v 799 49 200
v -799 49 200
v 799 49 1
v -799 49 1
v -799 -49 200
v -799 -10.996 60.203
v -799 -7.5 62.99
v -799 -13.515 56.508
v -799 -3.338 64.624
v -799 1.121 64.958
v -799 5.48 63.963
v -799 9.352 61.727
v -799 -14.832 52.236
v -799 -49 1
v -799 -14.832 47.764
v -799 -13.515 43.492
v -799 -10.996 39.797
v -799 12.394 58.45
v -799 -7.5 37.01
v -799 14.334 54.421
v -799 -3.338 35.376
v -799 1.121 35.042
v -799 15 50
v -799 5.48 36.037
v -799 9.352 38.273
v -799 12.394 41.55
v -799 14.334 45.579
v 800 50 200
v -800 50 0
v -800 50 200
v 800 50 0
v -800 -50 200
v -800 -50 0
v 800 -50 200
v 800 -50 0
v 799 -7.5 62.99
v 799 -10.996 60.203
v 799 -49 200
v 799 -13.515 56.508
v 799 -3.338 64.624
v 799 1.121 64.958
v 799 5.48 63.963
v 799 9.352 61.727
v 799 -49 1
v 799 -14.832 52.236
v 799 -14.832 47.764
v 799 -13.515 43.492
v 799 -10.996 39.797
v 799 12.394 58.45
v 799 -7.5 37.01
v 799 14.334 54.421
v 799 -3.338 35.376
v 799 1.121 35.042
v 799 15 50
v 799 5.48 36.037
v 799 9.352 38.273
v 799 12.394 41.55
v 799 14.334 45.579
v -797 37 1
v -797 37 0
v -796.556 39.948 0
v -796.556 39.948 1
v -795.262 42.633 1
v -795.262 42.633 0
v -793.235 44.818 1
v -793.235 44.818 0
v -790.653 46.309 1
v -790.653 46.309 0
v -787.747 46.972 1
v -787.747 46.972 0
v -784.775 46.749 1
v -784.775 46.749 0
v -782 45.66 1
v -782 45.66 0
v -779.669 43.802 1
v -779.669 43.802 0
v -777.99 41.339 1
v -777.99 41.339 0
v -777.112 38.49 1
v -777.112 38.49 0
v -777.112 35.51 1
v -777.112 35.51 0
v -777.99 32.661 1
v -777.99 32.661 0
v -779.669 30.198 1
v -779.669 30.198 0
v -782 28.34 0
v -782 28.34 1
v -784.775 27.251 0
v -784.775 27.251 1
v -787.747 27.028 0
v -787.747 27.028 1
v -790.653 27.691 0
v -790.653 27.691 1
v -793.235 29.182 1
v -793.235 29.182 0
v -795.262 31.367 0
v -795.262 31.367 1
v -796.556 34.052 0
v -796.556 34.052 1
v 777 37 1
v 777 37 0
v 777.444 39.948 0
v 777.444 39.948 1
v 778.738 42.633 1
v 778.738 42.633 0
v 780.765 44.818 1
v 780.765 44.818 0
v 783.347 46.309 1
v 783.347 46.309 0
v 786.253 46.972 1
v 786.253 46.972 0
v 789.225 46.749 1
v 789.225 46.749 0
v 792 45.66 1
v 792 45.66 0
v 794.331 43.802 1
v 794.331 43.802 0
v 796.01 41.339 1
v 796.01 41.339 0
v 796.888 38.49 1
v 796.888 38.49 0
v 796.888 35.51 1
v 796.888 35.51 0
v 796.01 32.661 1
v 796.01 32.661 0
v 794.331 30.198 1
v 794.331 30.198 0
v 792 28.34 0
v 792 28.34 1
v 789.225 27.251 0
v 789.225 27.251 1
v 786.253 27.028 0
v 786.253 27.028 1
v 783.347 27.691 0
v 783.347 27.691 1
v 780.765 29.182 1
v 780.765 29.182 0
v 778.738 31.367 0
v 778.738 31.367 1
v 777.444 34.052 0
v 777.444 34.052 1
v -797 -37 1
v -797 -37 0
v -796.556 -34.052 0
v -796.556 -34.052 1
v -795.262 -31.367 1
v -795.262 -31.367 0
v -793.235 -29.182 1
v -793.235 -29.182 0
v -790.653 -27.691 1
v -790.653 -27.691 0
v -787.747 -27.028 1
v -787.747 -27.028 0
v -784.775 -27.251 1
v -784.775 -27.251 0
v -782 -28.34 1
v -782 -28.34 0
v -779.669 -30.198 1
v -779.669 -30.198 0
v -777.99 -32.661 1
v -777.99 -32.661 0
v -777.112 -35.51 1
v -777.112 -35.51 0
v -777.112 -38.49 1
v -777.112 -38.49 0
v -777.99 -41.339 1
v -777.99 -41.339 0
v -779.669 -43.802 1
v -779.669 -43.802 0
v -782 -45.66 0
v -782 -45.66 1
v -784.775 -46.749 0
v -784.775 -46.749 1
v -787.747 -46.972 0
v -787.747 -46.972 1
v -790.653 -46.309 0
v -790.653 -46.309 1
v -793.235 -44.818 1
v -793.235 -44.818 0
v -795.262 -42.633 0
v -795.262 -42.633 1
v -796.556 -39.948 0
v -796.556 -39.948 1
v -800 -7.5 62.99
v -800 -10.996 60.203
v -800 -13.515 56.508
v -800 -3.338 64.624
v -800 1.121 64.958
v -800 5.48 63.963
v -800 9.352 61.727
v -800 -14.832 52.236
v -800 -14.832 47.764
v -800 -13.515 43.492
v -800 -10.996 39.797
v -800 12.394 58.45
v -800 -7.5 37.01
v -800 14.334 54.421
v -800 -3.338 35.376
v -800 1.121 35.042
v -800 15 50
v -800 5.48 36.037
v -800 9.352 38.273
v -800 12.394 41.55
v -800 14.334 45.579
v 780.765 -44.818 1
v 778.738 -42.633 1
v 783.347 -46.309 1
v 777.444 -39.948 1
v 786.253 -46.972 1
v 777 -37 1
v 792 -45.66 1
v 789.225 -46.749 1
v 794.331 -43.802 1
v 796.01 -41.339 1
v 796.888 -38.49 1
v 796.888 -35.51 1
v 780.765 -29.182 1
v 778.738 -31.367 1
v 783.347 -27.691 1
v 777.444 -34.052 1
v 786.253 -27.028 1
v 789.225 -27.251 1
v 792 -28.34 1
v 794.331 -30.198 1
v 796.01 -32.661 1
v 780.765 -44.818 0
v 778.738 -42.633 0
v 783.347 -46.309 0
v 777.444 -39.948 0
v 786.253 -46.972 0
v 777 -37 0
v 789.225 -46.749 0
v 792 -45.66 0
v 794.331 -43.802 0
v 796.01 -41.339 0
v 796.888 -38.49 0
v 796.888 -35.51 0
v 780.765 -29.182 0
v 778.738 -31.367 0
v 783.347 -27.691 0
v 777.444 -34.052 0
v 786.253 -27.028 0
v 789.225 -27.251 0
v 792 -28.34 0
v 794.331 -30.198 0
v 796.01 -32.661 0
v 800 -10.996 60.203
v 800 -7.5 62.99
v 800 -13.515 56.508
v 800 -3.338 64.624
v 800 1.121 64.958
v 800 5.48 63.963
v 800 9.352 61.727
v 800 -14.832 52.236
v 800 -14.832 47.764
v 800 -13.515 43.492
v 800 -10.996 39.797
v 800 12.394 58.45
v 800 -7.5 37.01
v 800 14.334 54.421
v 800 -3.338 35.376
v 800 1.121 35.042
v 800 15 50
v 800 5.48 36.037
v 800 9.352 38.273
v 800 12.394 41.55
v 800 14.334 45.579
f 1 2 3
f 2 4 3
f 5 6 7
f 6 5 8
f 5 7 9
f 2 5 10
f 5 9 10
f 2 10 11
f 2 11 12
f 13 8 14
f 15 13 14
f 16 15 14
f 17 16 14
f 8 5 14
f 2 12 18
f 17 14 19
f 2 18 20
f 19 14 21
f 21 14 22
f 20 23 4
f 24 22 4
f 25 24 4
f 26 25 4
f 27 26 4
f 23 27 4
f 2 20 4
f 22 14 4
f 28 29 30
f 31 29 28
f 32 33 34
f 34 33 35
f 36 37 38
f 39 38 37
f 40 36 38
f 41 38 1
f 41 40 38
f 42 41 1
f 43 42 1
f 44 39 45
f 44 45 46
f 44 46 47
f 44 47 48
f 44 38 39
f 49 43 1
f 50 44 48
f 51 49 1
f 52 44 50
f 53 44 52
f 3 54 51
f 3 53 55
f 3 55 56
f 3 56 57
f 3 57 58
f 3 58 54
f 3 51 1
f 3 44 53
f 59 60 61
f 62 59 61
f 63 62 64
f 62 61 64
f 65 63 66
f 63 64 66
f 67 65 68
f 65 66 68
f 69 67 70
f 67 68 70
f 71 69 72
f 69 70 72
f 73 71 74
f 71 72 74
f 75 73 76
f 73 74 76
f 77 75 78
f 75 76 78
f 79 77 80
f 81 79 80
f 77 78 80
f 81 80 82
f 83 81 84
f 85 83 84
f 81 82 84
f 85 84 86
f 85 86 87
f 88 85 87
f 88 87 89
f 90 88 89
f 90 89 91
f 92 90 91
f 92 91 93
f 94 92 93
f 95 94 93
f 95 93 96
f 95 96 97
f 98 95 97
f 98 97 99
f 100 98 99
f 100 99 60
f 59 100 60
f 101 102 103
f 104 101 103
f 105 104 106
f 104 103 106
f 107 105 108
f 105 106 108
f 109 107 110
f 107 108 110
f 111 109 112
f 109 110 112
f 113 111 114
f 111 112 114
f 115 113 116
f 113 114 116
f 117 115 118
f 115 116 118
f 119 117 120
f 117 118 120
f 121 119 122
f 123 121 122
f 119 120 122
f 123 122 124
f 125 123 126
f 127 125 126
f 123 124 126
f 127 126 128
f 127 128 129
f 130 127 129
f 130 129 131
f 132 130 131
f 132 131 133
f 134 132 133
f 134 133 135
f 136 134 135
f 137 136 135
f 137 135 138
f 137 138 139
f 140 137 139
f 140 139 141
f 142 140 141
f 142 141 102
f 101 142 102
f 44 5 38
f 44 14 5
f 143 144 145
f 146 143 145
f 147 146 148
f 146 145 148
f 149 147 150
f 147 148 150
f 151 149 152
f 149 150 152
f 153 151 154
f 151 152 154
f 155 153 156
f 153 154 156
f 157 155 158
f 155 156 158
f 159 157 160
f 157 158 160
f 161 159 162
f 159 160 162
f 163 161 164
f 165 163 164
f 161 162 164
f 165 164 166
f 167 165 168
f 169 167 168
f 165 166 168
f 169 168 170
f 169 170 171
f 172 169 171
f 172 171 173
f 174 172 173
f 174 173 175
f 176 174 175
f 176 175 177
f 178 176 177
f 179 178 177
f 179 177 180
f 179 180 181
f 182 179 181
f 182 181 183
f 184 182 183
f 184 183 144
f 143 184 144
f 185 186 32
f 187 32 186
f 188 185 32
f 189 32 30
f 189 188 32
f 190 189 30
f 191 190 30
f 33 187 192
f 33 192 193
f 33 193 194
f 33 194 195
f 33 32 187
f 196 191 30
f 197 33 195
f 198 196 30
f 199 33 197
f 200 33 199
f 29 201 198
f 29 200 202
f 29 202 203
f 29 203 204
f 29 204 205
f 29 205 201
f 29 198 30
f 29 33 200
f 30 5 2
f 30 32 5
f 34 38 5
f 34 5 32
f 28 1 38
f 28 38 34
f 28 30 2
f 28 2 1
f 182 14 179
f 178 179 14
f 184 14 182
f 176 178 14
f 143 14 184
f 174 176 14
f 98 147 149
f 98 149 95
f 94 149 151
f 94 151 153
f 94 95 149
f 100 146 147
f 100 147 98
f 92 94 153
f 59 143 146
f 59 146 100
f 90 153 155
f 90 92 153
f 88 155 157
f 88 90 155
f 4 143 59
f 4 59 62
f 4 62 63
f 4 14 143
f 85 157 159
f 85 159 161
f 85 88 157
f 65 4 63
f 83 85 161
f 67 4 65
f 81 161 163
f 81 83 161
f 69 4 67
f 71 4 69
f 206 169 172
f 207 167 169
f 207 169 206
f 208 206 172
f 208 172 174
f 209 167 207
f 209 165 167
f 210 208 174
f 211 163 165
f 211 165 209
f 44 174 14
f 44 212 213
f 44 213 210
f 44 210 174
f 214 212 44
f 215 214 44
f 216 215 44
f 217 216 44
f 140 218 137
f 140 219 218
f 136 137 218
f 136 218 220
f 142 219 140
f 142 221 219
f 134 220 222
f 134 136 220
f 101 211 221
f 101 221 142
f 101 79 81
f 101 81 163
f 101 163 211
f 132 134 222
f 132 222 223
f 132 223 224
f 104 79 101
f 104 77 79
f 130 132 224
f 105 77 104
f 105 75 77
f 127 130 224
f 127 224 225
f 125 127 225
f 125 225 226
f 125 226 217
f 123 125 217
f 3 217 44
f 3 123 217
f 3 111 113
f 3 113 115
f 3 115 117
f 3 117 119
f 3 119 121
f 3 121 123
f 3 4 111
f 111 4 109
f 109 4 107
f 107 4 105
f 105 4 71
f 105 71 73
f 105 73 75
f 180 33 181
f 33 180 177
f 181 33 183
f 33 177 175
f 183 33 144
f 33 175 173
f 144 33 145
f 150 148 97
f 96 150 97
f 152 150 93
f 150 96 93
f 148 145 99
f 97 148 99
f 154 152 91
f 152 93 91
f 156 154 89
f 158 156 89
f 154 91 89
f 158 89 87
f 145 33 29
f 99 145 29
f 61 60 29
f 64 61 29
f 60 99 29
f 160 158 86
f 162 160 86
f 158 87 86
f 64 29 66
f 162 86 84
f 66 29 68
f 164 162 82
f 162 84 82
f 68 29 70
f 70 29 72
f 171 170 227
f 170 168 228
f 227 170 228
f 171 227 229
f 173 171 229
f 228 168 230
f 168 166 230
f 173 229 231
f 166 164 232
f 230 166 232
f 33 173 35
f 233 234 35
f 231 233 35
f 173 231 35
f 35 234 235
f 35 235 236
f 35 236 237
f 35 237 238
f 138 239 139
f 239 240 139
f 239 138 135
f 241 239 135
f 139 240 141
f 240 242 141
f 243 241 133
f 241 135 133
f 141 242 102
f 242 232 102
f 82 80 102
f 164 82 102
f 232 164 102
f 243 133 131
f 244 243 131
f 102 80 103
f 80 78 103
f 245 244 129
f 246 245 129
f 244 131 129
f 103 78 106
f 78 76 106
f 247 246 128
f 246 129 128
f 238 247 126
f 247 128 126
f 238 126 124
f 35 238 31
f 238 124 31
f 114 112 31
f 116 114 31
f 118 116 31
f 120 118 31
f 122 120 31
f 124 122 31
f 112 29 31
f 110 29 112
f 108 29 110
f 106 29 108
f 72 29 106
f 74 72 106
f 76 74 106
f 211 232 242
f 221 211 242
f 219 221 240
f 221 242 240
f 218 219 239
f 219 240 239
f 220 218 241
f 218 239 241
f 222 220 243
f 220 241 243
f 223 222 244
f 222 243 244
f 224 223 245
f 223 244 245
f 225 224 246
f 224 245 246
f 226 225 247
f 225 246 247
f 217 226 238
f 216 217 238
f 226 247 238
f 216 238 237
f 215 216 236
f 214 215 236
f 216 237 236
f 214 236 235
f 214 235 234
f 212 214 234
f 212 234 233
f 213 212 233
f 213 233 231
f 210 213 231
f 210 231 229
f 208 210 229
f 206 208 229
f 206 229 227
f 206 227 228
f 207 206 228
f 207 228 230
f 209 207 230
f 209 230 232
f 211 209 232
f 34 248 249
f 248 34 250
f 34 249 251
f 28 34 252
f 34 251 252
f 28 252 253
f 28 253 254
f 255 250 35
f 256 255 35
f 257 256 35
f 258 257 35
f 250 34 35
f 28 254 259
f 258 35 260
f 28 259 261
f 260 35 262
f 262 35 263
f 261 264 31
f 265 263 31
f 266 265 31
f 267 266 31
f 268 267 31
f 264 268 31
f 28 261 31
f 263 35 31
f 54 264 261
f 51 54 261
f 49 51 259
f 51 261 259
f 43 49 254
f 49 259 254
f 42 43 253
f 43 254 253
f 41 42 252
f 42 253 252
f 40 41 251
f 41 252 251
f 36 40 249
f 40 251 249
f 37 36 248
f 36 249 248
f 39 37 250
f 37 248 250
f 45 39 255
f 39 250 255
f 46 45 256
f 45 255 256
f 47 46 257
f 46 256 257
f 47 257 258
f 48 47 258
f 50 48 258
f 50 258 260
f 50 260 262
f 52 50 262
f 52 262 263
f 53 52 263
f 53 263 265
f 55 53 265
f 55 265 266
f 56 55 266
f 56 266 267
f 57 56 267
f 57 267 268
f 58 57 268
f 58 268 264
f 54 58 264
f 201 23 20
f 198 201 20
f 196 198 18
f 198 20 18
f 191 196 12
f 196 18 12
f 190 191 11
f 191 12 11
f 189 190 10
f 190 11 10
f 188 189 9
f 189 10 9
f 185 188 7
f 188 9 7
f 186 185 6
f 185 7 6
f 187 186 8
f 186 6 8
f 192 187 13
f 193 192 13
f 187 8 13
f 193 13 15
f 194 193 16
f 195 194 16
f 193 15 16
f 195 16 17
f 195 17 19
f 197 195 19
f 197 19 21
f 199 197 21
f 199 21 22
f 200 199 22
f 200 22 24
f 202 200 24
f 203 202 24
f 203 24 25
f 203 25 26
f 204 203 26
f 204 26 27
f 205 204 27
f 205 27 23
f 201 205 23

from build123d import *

# Parameters (mm, degrees)
F0_W     = 1600
F0_H     = 100
F1_DEPTH = 200
F2_T     = -1
F5_D     = 20
F8_D     = 30


# Not quite as in the source:
# - the program builds the solid bodies; features that only make, move or delete a surface that nothing else refers to are left out


with BuildPart() as f1:
    # F0 (on Top) → F1 (new body)
    with BuildSketch(Plane.XY):
        Rectangle(F0_W, F0_H)
    extrude(amount=F1_DEPTH)

    # F2
    f2_openings = [f1.faces().sort_by_distance(p)[0] for p in [
        (0, 0, 200),
    ]]
    offset(amount=F2_T, openings=f2_openings)

    # F5 (through all)
    with Locations(Plane.XY.offset(1)):
        with Locations((787, 37), (787, -37), (-787, 37), (-787, -37)):
            Hole(F5_D / 2)

    # F8 (through all)
    with Locations(Plane(origin=(-800, 0, 0), x_dir=(0, -1, 0), z_dir=(-1, 0, 0))):
        with Locations((0, 50)):
            Hole(F8_D / 2)


solid = f1.part
